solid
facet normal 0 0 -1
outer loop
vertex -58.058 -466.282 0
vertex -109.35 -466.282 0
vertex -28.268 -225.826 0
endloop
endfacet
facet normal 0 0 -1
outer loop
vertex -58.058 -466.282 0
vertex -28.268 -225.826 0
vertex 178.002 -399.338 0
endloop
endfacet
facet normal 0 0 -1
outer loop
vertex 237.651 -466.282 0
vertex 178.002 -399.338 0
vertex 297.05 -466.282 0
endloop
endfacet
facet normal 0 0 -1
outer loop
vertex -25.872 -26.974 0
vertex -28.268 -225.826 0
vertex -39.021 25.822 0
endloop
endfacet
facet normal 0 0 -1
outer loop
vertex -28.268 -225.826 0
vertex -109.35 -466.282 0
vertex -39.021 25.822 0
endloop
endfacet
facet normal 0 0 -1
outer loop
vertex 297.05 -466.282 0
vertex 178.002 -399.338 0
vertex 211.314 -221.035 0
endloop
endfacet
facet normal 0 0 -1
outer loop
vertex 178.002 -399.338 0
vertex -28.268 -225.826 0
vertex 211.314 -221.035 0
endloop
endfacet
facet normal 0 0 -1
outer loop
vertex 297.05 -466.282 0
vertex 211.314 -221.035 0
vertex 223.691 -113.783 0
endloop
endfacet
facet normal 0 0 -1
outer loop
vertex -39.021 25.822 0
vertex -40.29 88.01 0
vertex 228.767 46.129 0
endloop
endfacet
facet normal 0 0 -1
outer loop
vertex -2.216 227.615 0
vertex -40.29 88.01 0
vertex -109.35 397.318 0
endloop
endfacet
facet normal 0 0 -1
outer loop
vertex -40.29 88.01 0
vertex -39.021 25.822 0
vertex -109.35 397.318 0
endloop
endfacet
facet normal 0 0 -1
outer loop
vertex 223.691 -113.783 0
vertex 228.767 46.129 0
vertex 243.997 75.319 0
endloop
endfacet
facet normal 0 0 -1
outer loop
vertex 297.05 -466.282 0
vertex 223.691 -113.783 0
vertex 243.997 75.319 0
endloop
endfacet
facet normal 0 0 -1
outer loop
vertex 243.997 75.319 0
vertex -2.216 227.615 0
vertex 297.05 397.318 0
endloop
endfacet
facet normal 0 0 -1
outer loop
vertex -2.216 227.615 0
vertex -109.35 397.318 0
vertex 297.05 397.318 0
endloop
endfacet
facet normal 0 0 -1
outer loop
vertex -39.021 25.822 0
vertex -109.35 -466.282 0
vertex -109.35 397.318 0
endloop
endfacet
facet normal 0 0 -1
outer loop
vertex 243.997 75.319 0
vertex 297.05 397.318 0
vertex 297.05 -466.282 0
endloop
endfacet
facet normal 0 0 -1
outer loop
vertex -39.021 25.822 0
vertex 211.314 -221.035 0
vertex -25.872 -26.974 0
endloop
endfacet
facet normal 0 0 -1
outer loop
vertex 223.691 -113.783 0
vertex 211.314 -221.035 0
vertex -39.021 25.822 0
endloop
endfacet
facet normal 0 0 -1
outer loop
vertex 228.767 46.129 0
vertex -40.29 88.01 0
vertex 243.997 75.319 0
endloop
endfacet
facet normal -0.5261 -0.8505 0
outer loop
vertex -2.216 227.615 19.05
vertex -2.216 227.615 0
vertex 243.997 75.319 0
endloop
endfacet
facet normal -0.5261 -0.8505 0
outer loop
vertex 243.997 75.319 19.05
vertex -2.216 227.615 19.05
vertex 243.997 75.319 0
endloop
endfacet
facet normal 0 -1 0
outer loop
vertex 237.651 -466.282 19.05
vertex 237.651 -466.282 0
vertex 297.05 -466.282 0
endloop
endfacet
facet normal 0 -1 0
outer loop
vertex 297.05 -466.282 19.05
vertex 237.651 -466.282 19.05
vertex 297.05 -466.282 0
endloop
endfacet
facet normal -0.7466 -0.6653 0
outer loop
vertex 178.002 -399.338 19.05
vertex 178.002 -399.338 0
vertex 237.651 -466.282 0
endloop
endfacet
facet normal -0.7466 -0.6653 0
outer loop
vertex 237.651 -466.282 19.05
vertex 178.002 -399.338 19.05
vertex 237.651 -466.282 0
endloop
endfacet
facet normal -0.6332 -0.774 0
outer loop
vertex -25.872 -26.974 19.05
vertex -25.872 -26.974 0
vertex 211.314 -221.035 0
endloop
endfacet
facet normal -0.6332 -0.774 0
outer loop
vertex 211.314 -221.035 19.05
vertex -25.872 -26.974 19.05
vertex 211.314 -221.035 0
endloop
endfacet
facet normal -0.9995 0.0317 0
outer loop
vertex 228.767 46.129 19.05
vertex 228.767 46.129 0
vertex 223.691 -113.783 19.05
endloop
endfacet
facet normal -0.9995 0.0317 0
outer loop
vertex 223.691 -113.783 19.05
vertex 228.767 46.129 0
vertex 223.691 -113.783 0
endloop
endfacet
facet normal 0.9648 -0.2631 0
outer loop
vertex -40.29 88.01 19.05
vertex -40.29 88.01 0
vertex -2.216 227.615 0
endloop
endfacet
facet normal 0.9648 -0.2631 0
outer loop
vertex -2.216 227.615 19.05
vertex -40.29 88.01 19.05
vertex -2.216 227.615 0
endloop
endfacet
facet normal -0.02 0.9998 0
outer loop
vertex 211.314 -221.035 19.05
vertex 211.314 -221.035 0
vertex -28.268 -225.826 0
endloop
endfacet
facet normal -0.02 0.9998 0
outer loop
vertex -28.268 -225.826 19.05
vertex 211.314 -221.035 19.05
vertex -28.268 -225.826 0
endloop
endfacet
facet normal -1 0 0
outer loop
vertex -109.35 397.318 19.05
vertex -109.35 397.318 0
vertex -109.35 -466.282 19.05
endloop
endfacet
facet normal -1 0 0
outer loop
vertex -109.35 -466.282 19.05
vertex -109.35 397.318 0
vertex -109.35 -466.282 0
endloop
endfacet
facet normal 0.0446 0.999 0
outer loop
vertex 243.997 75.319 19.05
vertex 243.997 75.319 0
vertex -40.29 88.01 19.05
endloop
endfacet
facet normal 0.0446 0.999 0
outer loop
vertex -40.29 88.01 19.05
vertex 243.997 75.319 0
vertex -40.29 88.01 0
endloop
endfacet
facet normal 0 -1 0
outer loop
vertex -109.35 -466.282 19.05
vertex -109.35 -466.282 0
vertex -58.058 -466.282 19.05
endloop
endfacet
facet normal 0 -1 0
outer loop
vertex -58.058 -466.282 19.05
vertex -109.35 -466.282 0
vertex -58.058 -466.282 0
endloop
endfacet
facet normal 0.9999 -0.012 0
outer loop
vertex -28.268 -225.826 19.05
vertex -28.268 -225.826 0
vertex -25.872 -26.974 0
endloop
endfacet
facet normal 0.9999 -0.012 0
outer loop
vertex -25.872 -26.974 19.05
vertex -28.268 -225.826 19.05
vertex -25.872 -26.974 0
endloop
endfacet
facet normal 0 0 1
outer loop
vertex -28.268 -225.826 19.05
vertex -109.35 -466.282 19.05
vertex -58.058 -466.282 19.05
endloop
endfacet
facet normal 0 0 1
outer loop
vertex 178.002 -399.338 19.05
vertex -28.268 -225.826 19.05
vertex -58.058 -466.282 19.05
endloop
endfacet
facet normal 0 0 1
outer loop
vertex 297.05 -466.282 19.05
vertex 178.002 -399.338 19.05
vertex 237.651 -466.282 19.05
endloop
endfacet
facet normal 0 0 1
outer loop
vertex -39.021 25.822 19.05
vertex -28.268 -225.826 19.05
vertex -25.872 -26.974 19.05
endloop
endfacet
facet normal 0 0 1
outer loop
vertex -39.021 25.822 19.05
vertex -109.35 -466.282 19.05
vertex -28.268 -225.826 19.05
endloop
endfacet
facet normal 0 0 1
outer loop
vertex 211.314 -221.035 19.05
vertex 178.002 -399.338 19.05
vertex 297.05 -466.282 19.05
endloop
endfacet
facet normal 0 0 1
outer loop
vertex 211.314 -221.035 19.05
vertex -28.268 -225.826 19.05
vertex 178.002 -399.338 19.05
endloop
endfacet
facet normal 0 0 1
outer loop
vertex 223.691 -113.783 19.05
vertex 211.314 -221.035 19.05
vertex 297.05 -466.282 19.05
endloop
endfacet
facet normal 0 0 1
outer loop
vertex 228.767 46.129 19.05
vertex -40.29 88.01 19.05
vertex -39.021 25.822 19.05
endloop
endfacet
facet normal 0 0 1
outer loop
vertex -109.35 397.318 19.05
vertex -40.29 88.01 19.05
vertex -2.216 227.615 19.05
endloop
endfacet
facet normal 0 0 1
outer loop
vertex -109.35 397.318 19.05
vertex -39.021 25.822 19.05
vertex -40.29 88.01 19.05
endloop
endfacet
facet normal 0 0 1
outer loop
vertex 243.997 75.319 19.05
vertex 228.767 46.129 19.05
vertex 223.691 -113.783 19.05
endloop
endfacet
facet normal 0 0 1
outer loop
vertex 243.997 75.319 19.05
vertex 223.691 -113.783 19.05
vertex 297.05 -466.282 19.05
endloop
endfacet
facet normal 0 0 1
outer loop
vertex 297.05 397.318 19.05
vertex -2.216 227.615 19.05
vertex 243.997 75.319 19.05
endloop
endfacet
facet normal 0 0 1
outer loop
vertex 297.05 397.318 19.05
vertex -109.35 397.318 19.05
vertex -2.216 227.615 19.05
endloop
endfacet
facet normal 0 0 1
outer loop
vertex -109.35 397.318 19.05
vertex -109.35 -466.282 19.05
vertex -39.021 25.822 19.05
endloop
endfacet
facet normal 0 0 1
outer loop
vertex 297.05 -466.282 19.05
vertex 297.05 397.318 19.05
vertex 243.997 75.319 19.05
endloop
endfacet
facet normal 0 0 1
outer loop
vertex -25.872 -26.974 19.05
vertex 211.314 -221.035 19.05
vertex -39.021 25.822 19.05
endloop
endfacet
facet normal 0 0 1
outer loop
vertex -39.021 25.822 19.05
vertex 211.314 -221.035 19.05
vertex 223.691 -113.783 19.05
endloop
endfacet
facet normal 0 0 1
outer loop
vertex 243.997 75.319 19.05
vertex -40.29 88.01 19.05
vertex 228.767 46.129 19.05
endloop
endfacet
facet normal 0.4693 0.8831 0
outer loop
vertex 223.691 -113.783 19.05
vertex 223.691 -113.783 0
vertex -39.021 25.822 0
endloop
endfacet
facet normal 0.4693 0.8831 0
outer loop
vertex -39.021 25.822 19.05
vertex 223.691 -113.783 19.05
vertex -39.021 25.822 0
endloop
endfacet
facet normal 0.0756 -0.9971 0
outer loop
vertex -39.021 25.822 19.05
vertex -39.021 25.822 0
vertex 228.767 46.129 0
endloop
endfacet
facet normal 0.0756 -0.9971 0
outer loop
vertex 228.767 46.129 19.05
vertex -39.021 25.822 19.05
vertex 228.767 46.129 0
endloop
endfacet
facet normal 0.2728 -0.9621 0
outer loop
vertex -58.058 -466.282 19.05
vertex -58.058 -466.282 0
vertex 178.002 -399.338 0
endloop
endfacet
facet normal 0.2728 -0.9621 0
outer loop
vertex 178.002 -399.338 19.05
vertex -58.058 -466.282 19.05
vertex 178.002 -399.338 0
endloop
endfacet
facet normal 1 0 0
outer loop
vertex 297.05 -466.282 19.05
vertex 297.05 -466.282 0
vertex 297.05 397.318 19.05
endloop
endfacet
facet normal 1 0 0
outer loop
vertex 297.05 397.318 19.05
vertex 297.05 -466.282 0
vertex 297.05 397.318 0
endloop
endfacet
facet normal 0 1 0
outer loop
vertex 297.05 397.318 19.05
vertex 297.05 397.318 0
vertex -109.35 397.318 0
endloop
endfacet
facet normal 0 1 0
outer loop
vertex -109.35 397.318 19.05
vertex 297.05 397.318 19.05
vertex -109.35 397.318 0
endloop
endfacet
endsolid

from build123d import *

# Parameters (mm, degrees)
F1_DEPTH = 19.05


with BuildPart() as f1:
    # F0 (on Top) → F1 (new body)
    with BuildSketch(Plane.XY):
        Polygon((297.050197, 397.317676), (-109.349803, 397.317676), (-109.349803, -466.282324), (-58.057822, -466.282324), (178.001612, -399.338305), (237.651035, -466.282324), (297.050197, -466.282324), align=None)
        Polygon((-28.267516, -225.826263), (-25.87169, -26.973946), (211.31359, -221.034646), align=None, mode=Mode.SUBTRACT)
        Polygon((228.767082, 46.128679), (223.69054, -113.782555), (-39.020769, 25.82249), align=None, mode=Mode.SUBTRACT)
        Polygon((-2.2158, 227.615237), (243.996739, 75.318821), (-40.289905, 88.010184), align=None, mode=Mode.SUBTRACT)
    extrude(amount=F1_DEPTH)


solid = f1.part
